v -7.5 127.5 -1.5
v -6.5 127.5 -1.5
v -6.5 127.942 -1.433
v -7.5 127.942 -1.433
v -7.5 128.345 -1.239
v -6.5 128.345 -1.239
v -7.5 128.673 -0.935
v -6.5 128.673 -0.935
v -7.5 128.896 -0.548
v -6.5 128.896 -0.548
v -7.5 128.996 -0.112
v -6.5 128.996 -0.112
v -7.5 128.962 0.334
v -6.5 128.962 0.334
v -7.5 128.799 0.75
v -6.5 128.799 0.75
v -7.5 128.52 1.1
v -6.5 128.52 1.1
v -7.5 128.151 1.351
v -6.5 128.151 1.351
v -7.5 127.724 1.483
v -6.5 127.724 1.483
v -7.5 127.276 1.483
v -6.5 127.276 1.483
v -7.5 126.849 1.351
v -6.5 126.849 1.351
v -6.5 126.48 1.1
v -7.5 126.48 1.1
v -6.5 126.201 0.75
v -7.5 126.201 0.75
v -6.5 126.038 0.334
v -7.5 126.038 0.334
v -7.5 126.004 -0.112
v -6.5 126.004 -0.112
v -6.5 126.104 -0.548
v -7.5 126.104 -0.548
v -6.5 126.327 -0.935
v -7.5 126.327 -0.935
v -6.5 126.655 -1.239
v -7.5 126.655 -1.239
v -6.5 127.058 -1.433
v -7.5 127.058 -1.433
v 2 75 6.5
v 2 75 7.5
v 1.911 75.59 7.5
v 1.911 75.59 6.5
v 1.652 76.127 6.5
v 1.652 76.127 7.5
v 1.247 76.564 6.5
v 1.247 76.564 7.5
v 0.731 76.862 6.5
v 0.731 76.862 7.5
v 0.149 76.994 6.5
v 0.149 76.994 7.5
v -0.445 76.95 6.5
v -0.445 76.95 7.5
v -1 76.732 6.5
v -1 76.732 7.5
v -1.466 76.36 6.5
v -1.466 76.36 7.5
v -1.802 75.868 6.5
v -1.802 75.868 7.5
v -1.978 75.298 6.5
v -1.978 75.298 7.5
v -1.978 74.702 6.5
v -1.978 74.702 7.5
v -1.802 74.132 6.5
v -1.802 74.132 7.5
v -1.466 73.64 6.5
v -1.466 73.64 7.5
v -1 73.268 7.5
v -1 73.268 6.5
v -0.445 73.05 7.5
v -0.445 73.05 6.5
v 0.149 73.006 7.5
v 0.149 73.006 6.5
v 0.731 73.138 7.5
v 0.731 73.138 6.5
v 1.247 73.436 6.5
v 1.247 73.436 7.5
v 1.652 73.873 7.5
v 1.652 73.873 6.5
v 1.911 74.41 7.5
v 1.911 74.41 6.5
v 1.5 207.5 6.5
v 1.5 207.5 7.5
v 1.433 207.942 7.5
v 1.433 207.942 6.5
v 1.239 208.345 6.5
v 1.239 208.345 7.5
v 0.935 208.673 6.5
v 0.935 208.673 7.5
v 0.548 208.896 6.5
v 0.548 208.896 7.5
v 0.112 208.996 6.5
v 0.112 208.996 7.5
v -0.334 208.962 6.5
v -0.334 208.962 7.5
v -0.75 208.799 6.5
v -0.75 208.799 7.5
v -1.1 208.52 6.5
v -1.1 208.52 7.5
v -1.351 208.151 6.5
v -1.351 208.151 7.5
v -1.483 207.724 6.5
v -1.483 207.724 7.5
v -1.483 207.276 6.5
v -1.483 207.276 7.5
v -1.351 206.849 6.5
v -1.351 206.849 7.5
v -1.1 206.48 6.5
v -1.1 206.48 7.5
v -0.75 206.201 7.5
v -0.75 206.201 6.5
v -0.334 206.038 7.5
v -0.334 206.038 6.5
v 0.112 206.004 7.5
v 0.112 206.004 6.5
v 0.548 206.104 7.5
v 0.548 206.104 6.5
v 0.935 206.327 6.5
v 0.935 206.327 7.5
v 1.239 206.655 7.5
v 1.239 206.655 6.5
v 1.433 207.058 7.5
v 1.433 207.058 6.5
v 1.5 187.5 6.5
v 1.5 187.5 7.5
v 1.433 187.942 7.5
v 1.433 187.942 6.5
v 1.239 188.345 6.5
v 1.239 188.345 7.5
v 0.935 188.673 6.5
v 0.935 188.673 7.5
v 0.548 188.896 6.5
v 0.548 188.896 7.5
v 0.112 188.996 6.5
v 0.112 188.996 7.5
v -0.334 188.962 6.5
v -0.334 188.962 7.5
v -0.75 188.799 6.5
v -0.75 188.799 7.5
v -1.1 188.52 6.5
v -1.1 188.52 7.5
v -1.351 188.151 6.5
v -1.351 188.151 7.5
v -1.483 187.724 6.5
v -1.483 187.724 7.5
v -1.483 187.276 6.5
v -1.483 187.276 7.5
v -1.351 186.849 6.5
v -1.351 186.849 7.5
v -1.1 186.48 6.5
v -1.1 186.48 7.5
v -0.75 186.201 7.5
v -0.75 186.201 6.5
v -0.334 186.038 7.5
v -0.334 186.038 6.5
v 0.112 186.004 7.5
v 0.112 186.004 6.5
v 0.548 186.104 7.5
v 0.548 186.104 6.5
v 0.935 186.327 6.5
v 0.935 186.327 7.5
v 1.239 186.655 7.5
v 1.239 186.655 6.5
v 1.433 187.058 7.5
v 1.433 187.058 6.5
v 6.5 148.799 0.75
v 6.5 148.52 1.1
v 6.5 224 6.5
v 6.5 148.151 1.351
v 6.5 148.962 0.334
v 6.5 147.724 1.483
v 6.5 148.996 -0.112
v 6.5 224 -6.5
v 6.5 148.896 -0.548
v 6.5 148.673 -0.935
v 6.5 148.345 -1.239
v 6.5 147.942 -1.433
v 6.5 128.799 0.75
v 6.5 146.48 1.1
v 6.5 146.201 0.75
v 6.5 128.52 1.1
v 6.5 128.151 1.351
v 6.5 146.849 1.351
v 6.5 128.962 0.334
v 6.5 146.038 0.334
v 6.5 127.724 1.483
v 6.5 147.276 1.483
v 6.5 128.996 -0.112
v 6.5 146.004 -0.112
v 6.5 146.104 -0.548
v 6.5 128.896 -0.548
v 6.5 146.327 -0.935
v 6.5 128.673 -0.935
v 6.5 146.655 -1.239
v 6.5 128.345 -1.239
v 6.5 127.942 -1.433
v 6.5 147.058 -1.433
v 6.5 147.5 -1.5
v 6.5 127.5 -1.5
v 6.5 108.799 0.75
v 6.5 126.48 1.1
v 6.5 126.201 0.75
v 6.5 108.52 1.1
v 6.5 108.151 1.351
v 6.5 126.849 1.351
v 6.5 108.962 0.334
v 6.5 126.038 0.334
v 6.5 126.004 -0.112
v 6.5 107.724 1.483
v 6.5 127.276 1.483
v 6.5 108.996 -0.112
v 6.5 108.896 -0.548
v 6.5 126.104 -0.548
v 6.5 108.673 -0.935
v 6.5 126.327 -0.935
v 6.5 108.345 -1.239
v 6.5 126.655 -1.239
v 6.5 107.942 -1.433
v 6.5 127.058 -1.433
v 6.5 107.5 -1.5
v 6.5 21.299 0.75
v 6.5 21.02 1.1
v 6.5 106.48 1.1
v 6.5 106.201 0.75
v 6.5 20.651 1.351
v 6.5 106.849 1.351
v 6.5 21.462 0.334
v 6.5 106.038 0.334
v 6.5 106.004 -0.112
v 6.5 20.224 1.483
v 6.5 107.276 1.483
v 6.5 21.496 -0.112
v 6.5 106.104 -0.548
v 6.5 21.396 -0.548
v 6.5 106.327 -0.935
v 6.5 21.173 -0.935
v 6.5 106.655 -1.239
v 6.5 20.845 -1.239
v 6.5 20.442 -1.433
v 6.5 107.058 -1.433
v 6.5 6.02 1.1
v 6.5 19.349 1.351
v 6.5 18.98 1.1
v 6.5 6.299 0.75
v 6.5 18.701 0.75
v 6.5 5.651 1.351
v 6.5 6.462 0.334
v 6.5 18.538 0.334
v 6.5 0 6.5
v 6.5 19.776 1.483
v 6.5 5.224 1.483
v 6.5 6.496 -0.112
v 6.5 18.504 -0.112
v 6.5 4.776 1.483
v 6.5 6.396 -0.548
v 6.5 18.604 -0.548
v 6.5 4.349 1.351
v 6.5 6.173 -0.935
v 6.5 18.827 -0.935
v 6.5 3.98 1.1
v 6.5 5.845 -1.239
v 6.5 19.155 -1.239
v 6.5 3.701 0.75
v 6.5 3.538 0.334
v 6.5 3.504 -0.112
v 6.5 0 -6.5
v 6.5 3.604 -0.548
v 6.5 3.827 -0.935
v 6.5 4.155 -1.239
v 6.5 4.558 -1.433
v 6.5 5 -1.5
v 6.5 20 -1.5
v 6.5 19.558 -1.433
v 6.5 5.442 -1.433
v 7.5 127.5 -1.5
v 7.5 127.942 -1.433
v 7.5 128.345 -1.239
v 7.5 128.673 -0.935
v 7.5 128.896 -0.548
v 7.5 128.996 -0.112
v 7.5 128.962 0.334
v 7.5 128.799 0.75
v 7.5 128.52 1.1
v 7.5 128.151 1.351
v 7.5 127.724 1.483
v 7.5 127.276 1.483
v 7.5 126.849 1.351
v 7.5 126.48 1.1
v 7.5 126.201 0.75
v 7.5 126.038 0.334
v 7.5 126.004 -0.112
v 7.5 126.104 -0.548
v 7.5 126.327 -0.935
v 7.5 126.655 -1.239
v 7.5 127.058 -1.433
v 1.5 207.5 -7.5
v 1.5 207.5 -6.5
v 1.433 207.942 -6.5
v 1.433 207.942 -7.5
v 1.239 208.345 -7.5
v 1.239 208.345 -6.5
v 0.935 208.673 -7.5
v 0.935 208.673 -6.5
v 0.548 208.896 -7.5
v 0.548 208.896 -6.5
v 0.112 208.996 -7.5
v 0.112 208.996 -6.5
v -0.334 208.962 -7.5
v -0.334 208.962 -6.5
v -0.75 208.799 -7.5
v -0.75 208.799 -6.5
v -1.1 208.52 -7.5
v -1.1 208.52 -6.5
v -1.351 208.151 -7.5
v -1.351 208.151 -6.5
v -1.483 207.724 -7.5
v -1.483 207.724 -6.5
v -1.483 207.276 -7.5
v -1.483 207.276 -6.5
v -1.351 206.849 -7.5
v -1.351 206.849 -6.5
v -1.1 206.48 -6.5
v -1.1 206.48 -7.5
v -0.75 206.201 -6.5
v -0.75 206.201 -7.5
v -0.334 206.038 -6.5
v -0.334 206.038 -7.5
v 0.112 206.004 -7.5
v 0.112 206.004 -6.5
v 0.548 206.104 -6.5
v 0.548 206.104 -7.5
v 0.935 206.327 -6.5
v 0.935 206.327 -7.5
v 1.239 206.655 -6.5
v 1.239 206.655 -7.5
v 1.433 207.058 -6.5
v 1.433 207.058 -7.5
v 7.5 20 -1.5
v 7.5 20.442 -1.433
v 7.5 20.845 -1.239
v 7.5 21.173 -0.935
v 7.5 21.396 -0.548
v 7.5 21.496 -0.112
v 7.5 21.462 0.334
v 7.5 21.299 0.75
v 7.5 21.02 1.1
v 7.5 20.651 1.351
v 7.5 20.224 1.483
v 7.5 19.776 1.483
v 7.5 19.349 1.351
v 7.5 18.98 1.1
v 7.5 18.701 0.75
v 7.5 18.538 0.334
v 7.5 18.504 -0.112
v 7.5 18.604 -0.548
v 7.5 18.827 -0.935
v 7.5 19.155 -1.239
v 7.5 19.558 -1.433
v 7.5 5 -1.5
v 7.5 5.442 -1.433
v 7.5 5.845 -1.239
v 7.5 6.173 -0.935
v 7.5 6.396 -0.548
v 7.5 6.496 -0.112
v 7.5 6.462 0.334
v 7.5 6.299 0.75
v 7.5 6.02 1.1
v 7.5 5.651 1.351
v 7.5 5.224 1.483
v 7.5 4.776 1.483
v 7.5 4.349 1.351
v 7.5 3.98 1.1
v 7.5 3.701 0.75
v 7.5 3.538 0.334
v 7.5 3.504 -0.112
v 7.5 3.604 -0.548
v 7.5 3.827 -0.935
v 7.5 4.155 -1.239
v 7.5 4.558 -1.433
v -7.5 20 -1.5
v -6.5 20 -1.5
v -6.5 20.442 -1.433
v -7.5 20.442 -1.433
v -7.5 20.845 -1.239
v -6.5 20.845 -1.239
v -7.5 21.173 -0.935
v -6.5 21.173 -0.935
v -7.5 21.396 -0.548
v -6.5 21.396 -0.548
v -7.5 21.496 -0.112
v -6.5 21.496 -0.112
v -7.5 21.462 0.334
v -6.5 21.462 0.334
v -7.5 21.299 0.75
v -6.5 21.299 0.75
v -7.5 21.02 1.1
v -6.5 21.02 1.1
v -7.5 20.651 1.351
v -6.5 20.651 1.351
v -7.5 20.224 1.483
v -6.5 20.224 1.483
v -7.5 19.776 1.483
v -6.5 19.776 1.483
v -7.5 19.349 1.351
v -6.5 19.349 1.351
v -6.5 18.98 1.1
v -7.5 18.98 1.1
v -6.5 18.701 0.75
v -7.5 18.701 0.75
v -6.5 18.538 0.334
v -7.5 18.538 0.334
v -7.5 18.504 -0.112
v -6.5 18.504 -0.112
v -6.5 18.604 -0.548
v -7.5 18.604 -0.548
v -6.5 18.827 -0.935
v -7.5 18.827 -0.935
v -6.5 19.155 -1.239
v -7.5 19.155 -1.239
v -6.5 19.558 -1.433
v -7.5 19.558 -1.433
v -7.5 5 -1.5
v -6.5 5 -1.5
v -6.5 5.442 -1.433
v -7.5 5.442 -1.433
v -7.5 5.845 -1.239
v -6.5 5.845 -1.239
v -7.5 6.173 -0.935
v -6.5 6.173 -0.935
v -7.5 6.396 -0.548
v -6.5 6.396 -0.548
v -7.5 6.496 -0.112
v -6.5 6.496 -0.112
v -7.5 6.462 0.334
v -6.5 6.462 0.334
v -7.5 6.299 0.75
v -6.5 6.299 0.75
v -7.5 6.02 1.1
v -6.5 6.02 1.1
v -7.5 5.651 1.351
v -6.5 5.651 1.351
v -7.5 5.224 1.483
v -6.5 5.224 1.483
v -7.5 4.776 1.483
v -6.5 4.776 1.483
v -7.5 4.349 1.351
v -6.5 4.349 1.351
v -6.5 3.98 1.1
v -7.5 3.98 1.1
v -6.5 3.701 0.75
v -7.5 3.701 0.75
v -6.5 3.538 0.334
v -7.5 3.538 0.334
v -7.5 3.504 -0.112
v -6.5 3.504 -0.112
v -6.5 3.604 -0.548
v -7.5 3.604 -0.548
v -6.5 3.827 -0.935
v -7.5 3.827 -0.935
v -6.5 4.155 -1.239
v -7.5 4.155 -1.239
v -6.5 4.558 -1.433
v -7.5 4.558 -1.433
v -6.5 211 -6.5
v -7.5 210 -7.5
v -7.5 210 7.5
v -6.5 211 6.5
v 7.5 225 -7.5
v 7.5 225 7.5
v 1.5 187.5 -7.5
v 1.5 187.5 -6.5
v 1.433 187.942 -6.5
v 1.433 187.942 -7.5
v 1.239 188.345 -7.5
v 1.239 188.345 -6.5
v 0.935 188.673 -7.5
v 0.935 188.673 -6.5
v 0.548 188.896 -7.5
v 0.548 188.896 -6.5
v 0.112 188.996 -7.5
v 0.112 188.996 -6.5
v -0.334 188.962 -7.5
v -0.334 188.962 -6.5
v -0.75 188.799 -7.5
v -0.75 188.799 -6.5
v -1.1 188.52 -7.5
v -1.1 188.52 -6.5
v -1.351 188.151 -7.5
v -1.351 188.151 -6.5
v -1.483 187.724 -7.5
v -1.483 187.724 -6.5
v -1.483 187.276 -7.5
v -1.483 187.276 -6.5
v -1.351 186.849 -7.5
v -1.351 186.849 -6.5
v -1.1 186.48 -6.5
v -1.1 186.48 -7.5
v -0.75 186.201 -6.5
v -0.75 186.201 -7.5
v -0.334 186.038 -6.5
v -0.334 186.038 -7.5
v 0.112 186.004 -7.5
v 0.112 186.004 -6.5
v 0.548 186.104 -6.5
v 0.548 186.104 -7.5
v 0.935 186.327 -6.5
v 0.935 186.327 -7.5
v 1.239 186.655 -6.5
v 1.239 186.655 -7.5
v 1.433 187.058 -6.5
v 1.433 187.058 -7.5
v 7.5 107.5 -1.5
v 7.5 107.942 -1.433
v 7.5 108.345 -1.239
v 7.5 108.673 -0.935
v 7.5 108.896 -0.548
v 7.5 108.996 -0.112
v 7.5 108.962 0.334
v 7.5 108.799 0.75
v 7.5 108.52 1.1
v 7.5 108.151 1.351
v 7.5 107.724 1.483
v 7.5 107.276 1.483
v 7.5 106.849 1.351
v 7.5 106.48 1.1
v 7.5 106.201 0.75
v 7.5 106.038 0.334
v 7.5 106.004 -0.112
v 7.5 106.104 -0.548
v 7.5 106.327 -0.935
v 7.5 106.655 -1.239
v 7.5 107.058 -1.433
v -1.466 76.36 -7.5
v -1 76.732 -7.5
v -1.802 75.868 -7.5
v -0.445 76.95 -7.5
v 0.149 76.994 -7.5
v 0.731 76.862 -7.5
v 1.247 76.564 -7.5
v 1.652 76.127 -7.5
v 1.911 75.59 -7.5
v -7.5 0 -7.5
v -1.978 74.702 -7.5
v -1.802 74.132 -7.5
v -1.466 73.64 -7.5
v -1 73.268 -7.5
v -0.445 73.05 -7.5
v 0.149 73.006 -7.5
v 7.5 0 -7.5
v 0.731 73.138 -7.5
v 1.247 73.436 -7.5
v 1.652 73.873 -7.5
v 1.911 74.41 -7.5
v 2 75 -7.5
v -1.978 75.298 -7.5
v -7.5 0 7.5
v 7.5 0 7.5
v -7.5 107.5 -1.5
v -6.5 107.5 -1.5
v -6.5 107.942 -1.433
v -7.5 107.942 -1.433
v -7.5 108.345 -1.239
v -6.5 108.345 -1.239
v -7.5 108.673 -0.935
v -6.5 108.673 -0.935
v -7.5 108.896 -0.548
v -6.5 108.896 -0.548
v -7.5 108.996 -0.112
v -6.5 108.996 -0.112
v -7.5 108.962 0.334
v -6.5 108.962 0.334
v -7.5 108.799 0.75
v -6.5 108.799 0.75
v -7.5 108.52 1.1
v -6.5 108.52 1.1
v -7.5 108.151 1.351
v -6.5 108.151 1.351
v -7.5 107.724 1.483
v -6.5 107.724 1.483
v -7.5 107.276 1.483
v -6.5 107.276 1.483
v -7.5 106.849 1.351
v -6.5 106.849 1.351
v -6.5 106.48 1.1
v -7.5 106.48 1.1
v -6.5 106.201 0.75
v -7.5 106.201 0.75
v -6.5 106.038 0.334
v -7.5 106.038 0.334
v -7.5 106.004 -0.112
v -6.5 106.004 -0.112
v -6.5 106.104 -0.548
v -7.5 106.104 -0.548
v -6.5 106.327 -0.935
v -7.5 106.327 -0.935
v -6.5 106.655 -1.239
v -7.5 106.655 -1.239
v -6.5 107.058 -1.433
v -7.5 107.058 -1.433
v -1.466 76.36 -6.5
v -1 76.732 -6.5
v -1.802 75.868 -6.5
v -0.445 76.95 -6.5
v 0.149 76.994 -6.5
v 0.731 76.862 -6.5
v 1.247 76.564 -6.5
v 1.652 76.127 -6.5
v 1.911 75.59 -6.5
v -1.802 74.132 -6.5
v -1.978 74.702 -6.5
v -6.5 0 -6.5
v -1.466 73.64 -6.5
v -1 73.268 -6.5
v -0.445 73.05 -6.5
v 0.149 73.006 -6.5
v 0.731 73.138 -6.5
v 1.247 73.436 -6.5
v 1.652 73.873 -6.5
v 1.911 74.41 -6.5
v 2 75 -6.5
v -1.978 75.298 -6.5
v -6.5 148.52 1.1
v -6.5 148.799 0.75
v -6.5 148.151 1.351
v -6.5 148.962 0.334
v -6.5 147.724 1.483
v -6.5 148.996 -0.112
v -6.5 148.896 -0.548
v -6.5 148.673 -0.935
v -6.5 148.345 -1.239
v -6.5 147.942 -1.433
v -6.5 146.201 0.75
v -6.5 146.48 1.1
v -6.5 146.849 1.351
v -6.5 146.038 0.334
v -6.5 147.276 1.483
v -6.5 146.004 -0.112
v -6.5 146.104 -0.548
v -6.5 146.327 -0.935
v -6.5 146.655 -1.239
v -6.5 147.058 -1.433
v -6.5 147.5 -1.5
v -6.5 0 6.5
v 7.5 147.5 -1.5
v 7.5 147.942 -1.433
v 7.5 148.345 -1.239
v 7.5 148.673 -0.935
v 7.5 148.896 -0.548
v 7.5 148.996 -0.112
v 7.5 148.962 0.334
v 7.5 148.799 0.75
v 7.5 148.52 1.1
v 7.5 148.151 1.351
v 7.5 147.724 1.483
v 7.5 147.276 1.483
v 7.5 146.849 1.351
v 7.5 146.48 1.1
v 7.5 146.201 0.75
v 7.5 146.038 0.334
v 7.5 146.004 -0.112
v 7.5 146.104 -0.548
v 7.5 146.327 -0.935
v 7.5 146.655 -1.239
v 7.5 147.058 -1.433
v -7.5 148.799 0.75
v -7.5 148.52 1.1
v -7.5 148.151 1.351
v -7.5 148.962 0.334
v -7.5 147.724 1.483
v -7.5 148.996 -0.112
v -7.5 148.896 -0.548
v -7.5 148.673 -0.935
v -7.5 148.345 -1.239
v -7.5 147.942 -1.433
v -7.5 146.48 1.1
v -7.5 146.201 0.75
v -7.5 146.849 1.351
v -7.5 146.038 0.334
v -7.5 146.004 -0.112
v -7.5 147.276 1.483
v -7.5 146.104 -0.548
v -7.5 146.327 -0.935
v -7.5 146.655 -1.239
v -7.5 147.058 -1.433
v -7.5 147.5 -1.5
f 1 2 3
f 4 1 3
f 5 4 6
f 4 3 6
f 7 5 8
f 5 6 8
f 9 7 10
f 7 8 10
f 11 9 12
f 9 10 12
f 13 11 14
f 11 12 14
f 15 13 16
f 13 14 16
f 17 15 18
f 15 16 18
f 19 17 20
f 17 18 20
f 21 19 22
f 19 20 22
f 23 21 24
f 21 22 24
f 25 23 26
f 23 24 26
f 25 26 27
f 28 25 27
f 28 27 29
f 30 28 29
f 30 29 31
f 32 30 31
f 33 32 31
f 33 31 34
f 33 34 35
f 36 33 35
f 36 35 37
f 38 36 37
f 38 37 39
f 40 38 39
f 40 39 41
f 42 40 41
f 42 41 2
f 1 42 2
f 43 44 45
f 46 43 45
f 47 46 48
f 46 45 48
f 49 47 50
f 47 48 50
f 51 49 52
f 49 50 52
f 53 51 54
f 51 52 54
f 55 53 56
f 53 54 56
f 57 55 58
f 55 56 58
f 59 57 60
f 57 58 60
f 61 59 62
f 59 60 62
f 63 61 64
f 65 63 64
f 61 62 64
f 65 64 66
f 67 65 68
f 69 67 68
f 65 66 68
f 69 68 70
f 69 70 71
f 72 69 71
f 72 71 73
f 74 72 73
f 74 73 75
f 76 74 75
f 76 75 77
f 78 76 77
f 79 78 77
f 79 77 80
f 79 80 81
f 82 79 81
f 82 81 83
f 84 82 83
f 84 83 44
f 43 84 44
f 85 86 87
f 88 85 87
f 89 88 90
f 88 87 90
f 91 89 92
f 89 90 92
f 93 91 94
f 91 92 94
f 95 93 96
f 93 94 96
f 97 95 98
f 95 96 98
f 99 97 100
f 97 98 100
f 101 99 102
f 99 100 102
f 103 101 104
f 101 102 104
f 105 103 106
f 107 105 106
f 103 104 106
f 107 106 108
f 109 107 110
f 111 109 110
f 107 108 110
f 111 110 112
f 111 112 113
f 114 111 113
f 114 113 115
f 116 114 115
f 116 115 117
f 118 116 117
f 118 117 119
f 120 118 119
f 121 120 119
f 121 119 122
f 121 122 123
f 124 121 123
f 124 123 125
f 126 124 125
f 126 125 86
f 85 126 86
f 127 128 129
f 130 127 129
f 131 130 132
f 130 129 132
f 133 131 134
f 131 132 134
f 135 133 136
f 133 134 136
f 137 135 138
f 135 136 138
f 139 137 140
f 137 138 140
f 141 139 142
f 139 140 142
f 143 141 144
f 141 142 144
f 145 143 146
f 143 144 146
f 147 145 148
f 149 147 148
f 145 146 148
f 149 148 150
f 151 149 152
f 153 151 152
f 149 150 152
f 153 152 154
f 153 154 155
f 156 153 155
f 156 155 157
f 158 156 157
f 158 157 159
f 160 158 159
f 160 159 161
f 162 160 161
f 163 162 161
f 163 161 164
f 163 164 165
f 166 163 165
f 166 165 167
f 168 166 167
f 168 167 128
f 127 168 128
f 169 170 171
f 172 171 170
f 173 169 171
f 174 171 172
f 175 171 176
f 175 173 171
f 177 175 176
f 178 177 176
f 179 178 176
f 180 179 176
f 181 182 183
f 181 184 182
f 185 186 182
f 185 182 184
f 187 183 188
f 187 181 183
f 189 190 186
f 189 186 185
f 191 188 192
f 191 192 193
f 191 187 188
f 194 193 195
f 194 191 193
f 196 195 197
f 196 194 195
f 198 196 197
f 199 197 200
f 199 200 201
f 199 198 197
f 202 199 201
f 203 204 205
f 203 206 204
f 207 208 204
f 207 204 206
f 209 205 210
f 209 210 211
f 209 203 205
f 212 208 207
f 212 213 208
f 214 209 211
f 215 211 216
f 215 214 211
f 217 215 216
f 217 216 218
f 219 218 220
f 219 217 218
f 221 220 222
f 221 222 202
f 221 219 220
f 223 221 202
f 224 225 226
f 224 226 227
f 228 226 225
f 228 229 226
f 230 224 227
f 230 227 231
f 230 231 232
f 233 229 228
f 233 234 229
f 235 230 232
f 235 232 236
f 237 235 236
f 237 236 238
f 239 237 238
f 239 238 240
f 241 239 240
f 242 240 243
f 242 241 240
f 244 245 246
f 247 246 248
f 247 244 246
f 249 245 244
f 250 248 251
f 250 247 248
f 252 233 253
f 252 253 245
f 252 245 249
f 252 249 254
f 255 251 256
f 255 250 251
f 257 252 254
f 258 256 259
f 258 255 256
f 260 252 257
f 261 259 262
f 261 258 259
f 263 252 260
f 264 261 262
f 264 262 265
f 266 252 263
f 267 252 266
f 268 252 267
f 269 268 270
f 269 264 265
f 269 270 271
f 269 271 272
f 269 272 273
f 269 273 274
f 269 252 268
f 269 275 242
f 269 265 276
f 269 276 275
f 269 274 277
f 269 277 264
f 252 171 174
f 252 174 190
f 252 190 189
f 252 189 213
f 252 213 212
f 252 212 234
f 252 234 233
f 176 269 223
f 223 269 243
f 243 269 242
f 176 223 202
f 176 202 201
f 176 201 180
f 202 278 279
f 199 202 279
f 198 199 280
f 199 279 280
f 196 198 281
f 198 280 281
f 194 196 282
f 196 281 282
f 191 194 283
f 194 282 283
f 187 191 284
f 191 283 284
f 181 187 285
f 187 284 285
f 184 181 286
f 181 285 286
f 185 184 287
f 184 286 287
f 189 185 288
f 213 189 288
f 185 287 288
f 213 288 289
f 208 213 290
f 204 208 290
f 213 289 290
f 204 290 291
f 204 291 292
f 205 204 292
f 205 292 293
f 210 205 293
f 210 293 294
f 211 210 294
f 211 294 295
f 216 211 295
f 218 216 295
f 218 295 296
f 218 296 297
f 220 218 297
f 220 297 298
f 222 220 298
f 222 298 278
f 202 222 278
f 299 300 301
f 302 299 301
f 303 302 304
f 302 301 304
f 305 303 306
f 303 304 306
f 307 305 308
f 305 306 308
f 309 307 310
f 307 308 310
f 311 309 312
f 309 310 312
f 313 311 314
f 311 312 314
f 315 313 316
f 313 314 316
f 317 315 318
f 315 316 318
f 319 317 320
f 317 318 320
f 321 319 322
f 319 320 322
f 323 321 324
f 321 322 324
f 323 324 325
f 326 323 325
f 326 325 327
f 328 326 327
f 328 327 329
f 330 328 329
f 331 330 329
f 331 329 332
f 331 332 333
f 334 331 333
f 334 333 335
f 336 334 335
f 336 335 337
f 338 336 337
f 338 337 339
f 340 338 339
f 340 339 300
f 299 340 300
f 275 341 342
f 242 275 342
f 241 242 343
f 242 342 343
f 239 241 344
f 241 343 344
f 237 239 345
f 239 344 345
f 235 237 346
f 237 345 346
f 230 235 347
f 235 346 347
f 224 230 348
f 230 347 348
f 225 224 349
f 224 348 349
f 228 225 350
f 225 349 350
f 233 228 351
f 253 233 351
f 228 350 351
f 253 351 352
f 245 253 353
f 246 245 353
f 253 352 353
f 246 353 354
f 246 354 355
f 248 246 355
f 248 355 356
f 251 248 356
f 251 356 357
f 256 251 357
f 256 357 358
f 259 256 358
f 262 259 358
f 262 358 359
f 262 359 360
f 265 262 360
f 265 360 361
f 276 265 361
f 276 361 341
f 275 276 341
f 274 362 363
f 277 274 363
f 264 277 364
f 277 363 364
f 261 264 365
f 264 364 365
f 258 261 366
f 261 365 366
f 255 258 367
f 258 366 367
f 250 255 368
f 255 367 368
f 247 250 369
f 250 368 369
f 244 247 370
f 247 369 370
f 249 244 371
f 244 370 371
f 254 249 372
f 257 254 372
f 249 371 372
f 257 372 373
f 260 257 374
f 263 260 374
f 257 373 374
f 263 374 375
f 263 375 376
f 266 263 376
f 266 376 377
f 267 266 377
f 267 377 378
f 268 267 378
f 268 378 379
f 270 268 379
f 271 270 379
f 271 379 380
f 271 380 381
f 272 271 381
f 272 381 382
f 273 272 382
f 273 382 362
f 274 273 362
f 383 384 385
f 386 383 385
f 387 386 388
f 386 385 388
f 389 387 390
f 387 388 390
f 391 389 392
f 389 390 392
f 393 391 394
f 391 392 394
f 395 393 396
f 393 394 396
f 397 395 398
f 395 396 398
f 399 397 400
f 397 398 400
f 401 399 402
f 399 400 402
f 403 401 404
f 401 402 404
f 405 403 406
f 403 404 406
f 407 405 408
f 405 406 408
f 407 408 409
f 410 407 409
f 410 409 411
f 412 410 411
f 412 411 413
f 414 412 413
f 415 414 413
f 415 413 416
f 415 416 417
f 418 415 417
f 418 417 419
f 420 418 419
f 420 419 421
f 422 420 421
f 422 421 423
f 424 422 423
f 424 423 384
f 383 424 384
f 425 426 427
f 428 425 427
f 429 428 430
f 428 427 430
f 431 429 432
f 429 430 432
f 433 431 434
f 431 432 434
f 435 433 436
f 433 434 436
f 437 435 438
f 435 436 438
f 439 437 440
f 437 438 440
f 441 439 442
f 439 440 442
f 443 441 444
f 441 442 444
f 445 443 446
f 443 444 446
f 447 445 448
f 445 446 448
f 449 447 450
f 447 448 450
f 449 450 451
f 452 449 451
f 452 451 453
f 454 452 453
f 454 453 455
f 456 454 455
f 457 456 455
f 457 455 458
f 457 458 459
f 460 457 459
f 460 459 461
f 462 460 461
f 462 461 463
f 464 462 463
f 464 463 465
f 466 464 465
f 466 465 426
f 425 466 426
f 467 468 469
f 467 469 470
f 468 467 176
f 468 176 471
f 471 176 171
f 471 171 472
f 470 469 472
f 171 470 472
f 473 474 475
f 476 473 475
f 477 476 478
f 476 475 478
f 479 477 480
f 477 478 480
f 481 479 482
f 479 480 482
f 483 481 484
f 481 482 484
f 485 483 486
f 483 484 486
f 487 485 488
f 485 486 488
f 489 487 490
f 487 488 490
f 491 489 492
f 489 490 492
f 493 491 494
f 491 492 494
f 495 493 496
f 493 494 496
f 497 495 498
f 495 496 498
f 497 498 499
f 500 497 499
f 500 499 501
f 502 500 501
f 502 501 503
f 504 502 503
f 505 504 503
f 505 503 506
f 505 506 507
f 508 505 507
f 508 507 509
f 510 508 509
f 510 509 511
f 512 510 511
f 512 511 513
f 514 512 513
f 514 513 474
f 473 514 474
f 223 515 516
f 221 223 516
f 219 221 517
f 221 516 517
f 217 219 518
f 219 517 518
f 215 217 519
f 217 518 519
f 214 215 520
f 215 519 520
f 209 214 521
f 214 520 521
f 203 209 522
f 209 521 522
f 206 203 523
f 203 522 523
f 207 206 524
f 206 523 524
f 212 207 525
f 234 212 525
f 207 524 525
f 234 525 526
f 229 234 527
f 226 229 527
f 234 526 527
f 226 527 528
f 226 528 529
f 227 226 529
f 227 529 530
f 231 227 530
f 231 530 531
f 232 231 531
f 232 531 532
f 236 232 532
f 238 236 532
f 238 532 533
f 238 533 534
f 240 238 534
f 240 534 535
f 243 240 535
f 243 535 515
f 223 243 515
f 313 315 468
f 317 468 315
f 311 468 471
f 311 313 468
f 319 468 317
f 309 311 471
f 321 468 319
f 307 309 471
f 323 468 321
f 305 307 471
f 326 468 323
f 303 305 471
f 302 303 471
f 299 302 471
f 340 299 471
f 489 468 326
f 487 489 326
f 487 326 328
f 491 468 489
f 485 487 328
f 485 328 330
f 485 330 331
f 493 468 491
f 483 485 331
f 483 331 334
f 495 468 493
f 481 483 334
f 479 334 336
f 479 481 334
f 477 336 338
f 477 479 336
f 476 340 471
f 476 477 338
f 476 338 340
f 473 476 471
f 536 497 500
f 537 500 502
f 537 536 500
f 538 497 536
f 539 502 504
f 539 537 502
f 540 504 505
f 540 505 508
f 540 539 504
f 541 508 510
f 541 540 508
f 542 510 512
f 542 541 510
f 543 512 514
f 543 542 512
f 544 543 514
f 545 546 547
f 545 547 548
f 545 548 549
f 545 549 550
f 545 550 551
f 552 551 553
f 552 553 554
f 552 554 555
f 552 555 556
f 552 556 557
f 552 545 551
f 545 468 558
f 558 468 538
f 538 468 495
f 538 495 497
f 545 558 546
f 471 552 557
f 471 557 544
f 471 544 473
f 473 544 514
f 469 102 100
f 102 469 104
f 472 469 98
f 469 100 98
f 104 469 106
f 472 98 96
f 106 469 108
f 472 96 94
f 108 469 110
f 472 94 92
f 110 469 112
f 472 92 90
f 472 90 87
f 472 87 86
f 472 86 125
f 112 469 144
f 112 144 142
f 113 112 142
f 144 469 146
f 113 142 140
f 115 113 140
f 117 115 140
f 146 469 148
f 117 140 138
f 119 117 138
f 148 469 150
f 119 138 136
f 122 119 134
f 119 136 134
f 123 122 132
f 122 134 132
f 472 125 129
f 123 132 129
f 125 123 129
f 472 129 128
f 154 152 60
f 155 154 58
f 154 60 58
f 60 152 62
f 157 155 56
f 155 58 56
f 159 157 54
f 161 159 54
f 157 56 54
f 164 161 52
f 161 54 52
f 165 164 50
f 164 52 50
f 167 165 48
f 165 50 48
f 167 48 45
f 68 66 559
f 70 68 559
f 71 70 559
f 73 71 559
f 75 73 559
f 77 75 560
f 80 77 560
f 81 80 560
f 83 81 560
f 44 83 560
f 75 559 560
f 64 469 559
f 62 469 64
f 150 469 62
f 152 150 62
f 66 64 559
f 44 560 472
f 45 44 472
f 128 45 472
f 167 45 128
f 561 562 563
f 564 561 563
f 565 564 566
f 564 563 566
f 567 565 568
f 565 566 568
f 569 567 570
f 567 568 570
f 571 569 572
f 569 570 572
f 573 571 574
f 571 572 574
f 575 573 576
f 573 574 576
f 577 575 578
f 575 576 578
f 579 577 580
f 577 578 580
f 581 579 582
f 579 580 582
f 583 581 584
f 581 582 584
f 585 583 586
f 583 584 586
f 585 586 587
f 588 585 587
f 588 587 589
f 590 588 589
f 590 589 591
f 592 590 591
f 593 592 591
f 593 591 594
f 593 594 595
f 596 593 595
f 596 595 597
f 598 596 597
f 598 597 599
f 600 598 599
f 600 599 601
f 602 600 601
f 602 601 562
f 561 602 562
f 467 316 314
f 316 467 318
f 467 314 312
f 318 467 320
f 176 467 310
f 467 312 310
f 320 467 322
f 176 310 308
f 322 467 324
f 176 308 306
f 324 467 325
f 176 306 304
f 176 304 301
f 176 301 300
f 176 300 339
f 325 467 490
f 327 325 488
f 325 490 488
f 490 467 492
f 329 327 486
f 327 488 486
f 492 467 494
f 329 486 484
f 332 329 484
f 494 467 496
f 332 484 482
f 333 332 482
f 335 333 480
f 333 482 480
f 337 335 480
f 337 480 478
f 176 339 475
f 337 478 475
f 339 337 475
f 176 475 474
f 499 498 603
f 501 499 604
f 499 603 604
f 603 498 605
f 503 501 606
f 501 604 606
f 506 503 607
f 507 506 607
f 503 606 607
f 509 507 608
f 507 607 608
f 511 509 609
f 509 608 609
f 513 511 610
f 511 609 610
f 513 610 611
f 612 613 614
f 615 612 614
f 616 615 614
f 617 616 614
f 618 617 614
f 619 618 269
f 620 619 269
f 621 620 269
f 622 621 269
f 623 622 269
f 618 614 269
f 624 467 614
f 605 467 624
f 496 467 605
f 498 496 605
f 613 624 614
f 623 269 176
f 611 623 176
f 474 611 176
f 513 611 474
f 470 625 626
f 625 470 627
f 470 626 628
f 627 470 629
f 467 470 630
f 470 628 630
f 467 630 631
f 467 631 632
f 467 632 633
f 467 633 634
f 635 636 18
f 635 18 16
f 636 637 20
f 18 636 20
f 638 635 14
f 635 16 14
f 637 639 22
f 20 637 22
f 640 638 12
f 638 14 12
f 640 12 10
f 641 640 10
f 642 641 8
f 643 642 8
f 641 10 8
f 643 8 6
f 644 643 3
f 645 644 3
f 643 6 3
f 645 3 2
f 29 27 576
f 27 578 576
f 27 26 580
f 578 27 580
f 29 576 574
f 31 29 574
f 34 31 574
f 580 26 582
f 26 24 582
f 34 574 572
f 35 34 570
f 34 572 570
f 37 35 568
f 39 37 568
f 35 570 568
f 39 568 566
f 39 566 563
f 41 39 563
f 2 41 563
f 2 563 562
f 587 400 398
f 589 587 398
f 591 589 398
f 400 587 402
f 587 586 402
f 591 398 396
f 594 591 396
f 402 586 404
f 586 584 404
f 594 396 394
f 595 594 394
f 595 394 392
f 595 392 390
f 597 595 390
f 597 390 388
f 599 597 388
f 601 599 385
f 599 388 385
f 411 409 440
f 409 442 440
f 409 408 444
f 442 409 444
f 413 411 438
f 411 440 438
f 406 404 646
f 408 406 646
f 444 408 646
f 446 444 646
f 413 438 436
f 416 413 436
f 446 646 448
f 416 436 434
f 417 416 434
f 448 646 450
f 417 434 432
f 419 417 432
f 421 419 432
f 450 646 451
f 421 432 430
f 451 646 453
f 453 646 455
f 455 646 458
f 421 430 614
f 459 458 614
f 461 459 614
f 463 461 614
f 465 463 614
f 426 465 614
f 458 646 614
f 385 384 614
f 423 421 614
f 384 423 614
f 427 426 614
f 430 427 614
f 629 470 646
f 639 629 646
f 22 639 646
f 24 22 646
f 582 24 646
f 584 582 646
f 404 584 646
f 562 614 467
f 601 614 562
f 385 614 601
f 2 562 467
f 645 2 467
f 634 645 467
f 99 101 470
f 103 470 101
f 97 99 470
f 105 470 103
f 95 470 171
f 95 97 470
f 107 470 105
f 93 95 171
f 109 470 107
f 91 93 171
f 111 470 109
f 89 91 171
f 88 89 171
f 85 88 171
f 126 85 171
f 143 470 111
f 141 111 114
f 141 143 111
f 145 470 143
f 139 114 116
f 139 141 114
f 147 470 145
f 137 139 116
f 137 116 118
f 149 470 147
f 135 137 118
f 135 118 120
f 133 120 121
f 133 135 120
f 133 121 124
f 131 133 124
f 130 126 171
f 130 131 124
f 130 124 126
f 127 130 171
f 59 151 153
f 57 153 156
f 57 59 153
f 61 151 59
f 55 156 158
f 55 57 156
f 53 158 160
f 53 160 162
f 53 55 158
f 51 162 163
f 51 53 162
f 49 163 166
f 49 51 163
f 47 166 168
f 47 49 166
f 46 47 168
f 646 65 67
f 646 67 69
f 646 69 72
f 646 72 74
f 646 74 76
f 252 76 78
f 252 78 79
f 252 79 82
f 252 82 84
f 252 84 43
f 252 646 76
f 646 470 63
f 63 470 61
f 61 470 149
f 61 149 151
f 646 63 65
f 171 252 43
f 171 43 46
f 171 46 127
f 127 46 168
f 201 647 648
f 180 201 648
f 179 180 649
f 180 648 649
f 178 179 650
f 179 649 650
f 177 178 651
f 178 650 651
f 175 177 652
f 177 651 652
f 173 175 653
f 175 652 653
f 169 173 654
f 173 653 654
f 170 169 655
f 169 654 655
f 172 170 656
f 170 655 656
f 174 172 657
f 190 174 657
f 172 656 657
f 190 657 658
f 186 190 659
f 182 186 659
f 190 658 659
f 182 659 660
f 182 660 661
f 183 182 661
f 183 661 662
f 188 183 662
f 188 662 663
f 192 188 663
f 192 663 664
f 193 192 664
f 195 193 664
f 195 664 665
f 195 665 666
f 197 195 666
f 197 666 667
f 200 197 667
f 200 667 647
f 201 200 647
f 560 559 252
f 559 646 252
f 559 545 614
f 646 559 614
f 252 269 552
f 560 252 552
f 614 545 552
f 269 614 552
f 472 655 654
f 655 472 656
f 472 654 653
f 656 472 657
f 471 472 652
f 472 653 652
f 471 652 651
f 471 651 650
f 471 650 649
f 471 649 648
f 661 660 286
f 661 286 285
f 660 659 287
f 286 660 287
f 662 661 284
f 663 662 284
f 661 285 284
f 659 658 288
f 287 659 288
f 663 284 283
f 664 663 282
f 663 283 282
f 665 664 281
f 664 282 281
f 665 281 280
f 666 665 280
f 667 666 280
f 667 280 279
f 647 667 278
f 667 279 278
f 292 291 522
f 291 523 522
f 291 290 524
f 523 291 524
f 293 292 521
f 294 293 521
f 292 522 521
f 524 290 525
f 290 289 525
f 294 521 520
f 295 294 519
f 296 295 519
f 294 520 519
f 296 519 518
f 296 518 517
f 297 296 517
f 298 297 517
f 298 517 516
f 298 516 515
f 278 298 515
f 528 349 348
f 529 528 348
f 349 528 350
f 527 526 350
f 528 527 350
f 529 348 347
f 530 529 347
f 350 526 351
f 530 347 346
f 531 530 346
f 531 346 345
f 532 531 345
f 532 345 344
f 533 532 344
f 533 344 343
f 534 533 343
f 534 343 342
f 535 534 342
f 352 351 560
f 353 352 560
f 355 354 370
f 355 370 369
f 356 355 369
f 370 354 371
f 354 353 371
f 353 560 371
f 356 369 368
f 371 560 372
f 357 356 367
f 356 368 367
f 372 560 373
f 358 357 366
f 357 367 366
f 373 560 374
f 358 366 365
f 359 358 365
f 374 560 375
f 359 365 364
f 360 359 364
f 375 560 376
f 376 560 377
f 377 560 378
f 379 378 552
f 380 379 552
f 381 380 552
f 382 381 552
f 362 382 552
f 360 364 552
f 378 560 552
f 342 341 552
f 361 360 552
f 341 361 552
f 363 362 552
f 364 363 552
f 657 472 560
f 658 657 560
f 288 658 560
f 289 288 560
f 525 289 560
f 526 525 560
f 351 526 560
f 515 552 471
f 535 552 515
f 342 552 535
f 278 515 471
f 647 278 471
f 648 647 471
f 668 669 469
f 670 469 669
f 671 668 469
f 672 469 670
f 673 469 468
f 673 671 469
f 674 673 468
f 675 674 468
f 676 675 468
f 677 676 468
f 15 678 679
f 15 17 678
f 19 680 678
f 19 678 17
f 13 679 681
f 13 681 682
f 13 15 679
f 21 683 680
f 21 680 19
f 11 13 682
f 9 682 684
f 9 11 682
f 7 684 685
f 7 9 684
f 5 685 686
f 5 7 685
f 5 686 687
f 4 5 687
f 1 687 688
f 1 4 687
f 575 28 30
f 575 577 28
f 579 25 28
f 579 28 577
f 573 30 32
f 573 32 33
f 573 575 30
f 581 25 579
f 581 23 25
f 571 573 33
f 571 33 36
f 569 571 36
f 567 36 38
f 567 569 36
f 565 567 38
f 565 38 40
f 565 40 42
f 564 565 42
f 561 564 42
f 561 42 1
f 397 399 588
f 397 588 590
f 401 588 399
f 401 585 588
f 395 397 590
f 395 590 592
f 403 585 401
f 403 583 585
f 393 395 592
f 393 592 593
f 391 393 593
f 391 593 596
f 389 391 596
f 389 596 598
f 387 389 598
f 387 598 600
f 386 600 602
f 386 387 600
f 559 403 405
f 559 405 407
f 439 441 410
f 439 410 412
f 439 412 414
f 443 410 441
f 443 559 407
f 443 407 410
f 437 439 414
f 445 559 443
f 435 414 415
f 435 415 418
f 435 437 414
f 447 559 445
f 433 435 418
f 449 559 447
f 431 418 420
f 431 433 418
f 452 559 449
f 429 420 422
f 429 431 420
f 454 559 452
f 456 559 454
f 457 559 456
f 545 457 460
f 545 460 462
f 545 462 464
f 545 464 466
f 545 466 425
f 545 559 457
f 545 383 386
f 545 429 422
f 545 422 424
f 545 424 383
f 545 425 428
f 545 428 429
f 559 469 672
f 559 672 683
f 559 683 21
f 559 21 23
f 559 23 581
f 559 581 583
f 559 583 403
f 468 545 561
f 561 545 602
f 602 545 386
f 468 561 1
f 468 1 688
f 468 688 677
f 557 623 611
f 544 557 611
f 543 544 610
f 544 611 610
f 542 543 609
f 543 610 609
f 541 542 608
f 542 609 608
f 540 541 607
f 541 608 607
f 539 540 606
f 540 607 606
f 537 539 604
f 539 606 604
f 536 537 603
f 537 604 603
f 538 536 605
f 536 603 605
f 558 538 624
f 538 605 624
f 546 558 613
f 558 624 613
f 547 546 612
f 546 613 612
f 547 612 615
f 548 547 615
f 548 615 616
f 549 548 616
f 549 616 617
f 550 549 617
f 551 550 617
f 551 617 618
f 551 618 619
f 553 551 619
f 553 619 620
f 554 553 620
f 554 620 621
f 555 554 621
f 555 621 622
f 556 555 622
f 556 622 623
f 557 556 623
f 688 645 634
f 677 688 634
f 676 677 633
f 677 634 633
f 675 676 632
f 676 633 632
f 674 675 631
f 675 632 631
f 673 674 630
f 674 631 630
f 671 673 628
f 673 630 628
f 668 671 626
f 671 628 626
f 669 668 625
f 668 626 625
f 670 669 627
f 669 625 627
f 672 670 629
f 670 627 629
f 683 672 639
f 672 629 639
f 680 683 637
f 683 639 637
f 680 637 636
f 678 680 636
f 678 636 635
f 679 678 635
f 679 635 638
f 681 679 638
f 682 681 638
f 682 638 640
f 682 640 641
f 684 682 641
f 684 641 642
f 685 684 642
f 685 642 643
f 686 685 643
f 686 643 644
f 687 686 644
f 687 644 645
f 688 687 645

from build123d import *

# Parameters (mm, degrees)
SKETCH_1_W          = 15
SKETCH_1_H          = 15
SKETCH_1_W_2        = 13
SKETCH_1_H_2        = 13
EXTRUDE_1_DEPTH     = 225
SKETCH_2_R          = 1.5
SKETCH_2_R_2        = 2
CUT_EXTRUDE_1_DEPTH = 226.624134347
SKETCH_3_R          = 1.5
CUT_EXTRUDE_2_DEPTH = 226.624134347


with BuildPart() as part:
    # 草图1 → 凸台-拉伸1 (new body)
    with BuildSketch(Plane(origin=(0, 0, 0), x_dir=(1, 0, 0), z_dir=(0, 1, 0))):
        Rectangle(SKETCH_1_W, SKETCH_1_H)
        Rectangle(SKETCH_1_W_2, SKETCH_1_H_2, mode=Mode.SUBTRACT)
    extrude(amount=EXTRUDE_1_DEPTH)

    # 草图2 → 切除-拉伸1 (cut, through all)
    with BuildSketch(Plane.XY.offset(7.5)):
        with Locations((0, 207.5)):
            Circle(SKETCH_2_R)
        with Locations((0, 187.5)):
            Circle(SKETCH_2_R)
        with Locations((0, 75)):
            Circle(SKETCH_2_R_2)
        Polygon((7.5, 225), (-7.5, 225), (-7.5, 210), align=None)
    extrude(amount=-CUT_EXTRUDE_1_DEPTH, mode=Mode.SUBTRACT)

    # 草图3 → 切除-拉伸2 (cut, through all)
    with BuildSketch(Plane(origin=(7.5, 0, 0), x_dir=(0, 0, -1), z_dir=(1, 0, 0))):
        with Locations((0, 5)):
            Circle(SKETCH_3_R)
        with Locations((0, 20)):
            Circle(SKETCH_3_R)
        with Locations((0, 127.5)):
            Circle(SKETCH_3_R)
        with Locations((0, 147.5)):
            Circle(SKETCH_3_R)
        with Locations((0, 107.5)):
            Circle(SKETCH_3_R)
    extrude(amount=-CUT_EXTRUDE_2_DEPTH, mode=Mode.SUBTRACT)


solid = part.part
